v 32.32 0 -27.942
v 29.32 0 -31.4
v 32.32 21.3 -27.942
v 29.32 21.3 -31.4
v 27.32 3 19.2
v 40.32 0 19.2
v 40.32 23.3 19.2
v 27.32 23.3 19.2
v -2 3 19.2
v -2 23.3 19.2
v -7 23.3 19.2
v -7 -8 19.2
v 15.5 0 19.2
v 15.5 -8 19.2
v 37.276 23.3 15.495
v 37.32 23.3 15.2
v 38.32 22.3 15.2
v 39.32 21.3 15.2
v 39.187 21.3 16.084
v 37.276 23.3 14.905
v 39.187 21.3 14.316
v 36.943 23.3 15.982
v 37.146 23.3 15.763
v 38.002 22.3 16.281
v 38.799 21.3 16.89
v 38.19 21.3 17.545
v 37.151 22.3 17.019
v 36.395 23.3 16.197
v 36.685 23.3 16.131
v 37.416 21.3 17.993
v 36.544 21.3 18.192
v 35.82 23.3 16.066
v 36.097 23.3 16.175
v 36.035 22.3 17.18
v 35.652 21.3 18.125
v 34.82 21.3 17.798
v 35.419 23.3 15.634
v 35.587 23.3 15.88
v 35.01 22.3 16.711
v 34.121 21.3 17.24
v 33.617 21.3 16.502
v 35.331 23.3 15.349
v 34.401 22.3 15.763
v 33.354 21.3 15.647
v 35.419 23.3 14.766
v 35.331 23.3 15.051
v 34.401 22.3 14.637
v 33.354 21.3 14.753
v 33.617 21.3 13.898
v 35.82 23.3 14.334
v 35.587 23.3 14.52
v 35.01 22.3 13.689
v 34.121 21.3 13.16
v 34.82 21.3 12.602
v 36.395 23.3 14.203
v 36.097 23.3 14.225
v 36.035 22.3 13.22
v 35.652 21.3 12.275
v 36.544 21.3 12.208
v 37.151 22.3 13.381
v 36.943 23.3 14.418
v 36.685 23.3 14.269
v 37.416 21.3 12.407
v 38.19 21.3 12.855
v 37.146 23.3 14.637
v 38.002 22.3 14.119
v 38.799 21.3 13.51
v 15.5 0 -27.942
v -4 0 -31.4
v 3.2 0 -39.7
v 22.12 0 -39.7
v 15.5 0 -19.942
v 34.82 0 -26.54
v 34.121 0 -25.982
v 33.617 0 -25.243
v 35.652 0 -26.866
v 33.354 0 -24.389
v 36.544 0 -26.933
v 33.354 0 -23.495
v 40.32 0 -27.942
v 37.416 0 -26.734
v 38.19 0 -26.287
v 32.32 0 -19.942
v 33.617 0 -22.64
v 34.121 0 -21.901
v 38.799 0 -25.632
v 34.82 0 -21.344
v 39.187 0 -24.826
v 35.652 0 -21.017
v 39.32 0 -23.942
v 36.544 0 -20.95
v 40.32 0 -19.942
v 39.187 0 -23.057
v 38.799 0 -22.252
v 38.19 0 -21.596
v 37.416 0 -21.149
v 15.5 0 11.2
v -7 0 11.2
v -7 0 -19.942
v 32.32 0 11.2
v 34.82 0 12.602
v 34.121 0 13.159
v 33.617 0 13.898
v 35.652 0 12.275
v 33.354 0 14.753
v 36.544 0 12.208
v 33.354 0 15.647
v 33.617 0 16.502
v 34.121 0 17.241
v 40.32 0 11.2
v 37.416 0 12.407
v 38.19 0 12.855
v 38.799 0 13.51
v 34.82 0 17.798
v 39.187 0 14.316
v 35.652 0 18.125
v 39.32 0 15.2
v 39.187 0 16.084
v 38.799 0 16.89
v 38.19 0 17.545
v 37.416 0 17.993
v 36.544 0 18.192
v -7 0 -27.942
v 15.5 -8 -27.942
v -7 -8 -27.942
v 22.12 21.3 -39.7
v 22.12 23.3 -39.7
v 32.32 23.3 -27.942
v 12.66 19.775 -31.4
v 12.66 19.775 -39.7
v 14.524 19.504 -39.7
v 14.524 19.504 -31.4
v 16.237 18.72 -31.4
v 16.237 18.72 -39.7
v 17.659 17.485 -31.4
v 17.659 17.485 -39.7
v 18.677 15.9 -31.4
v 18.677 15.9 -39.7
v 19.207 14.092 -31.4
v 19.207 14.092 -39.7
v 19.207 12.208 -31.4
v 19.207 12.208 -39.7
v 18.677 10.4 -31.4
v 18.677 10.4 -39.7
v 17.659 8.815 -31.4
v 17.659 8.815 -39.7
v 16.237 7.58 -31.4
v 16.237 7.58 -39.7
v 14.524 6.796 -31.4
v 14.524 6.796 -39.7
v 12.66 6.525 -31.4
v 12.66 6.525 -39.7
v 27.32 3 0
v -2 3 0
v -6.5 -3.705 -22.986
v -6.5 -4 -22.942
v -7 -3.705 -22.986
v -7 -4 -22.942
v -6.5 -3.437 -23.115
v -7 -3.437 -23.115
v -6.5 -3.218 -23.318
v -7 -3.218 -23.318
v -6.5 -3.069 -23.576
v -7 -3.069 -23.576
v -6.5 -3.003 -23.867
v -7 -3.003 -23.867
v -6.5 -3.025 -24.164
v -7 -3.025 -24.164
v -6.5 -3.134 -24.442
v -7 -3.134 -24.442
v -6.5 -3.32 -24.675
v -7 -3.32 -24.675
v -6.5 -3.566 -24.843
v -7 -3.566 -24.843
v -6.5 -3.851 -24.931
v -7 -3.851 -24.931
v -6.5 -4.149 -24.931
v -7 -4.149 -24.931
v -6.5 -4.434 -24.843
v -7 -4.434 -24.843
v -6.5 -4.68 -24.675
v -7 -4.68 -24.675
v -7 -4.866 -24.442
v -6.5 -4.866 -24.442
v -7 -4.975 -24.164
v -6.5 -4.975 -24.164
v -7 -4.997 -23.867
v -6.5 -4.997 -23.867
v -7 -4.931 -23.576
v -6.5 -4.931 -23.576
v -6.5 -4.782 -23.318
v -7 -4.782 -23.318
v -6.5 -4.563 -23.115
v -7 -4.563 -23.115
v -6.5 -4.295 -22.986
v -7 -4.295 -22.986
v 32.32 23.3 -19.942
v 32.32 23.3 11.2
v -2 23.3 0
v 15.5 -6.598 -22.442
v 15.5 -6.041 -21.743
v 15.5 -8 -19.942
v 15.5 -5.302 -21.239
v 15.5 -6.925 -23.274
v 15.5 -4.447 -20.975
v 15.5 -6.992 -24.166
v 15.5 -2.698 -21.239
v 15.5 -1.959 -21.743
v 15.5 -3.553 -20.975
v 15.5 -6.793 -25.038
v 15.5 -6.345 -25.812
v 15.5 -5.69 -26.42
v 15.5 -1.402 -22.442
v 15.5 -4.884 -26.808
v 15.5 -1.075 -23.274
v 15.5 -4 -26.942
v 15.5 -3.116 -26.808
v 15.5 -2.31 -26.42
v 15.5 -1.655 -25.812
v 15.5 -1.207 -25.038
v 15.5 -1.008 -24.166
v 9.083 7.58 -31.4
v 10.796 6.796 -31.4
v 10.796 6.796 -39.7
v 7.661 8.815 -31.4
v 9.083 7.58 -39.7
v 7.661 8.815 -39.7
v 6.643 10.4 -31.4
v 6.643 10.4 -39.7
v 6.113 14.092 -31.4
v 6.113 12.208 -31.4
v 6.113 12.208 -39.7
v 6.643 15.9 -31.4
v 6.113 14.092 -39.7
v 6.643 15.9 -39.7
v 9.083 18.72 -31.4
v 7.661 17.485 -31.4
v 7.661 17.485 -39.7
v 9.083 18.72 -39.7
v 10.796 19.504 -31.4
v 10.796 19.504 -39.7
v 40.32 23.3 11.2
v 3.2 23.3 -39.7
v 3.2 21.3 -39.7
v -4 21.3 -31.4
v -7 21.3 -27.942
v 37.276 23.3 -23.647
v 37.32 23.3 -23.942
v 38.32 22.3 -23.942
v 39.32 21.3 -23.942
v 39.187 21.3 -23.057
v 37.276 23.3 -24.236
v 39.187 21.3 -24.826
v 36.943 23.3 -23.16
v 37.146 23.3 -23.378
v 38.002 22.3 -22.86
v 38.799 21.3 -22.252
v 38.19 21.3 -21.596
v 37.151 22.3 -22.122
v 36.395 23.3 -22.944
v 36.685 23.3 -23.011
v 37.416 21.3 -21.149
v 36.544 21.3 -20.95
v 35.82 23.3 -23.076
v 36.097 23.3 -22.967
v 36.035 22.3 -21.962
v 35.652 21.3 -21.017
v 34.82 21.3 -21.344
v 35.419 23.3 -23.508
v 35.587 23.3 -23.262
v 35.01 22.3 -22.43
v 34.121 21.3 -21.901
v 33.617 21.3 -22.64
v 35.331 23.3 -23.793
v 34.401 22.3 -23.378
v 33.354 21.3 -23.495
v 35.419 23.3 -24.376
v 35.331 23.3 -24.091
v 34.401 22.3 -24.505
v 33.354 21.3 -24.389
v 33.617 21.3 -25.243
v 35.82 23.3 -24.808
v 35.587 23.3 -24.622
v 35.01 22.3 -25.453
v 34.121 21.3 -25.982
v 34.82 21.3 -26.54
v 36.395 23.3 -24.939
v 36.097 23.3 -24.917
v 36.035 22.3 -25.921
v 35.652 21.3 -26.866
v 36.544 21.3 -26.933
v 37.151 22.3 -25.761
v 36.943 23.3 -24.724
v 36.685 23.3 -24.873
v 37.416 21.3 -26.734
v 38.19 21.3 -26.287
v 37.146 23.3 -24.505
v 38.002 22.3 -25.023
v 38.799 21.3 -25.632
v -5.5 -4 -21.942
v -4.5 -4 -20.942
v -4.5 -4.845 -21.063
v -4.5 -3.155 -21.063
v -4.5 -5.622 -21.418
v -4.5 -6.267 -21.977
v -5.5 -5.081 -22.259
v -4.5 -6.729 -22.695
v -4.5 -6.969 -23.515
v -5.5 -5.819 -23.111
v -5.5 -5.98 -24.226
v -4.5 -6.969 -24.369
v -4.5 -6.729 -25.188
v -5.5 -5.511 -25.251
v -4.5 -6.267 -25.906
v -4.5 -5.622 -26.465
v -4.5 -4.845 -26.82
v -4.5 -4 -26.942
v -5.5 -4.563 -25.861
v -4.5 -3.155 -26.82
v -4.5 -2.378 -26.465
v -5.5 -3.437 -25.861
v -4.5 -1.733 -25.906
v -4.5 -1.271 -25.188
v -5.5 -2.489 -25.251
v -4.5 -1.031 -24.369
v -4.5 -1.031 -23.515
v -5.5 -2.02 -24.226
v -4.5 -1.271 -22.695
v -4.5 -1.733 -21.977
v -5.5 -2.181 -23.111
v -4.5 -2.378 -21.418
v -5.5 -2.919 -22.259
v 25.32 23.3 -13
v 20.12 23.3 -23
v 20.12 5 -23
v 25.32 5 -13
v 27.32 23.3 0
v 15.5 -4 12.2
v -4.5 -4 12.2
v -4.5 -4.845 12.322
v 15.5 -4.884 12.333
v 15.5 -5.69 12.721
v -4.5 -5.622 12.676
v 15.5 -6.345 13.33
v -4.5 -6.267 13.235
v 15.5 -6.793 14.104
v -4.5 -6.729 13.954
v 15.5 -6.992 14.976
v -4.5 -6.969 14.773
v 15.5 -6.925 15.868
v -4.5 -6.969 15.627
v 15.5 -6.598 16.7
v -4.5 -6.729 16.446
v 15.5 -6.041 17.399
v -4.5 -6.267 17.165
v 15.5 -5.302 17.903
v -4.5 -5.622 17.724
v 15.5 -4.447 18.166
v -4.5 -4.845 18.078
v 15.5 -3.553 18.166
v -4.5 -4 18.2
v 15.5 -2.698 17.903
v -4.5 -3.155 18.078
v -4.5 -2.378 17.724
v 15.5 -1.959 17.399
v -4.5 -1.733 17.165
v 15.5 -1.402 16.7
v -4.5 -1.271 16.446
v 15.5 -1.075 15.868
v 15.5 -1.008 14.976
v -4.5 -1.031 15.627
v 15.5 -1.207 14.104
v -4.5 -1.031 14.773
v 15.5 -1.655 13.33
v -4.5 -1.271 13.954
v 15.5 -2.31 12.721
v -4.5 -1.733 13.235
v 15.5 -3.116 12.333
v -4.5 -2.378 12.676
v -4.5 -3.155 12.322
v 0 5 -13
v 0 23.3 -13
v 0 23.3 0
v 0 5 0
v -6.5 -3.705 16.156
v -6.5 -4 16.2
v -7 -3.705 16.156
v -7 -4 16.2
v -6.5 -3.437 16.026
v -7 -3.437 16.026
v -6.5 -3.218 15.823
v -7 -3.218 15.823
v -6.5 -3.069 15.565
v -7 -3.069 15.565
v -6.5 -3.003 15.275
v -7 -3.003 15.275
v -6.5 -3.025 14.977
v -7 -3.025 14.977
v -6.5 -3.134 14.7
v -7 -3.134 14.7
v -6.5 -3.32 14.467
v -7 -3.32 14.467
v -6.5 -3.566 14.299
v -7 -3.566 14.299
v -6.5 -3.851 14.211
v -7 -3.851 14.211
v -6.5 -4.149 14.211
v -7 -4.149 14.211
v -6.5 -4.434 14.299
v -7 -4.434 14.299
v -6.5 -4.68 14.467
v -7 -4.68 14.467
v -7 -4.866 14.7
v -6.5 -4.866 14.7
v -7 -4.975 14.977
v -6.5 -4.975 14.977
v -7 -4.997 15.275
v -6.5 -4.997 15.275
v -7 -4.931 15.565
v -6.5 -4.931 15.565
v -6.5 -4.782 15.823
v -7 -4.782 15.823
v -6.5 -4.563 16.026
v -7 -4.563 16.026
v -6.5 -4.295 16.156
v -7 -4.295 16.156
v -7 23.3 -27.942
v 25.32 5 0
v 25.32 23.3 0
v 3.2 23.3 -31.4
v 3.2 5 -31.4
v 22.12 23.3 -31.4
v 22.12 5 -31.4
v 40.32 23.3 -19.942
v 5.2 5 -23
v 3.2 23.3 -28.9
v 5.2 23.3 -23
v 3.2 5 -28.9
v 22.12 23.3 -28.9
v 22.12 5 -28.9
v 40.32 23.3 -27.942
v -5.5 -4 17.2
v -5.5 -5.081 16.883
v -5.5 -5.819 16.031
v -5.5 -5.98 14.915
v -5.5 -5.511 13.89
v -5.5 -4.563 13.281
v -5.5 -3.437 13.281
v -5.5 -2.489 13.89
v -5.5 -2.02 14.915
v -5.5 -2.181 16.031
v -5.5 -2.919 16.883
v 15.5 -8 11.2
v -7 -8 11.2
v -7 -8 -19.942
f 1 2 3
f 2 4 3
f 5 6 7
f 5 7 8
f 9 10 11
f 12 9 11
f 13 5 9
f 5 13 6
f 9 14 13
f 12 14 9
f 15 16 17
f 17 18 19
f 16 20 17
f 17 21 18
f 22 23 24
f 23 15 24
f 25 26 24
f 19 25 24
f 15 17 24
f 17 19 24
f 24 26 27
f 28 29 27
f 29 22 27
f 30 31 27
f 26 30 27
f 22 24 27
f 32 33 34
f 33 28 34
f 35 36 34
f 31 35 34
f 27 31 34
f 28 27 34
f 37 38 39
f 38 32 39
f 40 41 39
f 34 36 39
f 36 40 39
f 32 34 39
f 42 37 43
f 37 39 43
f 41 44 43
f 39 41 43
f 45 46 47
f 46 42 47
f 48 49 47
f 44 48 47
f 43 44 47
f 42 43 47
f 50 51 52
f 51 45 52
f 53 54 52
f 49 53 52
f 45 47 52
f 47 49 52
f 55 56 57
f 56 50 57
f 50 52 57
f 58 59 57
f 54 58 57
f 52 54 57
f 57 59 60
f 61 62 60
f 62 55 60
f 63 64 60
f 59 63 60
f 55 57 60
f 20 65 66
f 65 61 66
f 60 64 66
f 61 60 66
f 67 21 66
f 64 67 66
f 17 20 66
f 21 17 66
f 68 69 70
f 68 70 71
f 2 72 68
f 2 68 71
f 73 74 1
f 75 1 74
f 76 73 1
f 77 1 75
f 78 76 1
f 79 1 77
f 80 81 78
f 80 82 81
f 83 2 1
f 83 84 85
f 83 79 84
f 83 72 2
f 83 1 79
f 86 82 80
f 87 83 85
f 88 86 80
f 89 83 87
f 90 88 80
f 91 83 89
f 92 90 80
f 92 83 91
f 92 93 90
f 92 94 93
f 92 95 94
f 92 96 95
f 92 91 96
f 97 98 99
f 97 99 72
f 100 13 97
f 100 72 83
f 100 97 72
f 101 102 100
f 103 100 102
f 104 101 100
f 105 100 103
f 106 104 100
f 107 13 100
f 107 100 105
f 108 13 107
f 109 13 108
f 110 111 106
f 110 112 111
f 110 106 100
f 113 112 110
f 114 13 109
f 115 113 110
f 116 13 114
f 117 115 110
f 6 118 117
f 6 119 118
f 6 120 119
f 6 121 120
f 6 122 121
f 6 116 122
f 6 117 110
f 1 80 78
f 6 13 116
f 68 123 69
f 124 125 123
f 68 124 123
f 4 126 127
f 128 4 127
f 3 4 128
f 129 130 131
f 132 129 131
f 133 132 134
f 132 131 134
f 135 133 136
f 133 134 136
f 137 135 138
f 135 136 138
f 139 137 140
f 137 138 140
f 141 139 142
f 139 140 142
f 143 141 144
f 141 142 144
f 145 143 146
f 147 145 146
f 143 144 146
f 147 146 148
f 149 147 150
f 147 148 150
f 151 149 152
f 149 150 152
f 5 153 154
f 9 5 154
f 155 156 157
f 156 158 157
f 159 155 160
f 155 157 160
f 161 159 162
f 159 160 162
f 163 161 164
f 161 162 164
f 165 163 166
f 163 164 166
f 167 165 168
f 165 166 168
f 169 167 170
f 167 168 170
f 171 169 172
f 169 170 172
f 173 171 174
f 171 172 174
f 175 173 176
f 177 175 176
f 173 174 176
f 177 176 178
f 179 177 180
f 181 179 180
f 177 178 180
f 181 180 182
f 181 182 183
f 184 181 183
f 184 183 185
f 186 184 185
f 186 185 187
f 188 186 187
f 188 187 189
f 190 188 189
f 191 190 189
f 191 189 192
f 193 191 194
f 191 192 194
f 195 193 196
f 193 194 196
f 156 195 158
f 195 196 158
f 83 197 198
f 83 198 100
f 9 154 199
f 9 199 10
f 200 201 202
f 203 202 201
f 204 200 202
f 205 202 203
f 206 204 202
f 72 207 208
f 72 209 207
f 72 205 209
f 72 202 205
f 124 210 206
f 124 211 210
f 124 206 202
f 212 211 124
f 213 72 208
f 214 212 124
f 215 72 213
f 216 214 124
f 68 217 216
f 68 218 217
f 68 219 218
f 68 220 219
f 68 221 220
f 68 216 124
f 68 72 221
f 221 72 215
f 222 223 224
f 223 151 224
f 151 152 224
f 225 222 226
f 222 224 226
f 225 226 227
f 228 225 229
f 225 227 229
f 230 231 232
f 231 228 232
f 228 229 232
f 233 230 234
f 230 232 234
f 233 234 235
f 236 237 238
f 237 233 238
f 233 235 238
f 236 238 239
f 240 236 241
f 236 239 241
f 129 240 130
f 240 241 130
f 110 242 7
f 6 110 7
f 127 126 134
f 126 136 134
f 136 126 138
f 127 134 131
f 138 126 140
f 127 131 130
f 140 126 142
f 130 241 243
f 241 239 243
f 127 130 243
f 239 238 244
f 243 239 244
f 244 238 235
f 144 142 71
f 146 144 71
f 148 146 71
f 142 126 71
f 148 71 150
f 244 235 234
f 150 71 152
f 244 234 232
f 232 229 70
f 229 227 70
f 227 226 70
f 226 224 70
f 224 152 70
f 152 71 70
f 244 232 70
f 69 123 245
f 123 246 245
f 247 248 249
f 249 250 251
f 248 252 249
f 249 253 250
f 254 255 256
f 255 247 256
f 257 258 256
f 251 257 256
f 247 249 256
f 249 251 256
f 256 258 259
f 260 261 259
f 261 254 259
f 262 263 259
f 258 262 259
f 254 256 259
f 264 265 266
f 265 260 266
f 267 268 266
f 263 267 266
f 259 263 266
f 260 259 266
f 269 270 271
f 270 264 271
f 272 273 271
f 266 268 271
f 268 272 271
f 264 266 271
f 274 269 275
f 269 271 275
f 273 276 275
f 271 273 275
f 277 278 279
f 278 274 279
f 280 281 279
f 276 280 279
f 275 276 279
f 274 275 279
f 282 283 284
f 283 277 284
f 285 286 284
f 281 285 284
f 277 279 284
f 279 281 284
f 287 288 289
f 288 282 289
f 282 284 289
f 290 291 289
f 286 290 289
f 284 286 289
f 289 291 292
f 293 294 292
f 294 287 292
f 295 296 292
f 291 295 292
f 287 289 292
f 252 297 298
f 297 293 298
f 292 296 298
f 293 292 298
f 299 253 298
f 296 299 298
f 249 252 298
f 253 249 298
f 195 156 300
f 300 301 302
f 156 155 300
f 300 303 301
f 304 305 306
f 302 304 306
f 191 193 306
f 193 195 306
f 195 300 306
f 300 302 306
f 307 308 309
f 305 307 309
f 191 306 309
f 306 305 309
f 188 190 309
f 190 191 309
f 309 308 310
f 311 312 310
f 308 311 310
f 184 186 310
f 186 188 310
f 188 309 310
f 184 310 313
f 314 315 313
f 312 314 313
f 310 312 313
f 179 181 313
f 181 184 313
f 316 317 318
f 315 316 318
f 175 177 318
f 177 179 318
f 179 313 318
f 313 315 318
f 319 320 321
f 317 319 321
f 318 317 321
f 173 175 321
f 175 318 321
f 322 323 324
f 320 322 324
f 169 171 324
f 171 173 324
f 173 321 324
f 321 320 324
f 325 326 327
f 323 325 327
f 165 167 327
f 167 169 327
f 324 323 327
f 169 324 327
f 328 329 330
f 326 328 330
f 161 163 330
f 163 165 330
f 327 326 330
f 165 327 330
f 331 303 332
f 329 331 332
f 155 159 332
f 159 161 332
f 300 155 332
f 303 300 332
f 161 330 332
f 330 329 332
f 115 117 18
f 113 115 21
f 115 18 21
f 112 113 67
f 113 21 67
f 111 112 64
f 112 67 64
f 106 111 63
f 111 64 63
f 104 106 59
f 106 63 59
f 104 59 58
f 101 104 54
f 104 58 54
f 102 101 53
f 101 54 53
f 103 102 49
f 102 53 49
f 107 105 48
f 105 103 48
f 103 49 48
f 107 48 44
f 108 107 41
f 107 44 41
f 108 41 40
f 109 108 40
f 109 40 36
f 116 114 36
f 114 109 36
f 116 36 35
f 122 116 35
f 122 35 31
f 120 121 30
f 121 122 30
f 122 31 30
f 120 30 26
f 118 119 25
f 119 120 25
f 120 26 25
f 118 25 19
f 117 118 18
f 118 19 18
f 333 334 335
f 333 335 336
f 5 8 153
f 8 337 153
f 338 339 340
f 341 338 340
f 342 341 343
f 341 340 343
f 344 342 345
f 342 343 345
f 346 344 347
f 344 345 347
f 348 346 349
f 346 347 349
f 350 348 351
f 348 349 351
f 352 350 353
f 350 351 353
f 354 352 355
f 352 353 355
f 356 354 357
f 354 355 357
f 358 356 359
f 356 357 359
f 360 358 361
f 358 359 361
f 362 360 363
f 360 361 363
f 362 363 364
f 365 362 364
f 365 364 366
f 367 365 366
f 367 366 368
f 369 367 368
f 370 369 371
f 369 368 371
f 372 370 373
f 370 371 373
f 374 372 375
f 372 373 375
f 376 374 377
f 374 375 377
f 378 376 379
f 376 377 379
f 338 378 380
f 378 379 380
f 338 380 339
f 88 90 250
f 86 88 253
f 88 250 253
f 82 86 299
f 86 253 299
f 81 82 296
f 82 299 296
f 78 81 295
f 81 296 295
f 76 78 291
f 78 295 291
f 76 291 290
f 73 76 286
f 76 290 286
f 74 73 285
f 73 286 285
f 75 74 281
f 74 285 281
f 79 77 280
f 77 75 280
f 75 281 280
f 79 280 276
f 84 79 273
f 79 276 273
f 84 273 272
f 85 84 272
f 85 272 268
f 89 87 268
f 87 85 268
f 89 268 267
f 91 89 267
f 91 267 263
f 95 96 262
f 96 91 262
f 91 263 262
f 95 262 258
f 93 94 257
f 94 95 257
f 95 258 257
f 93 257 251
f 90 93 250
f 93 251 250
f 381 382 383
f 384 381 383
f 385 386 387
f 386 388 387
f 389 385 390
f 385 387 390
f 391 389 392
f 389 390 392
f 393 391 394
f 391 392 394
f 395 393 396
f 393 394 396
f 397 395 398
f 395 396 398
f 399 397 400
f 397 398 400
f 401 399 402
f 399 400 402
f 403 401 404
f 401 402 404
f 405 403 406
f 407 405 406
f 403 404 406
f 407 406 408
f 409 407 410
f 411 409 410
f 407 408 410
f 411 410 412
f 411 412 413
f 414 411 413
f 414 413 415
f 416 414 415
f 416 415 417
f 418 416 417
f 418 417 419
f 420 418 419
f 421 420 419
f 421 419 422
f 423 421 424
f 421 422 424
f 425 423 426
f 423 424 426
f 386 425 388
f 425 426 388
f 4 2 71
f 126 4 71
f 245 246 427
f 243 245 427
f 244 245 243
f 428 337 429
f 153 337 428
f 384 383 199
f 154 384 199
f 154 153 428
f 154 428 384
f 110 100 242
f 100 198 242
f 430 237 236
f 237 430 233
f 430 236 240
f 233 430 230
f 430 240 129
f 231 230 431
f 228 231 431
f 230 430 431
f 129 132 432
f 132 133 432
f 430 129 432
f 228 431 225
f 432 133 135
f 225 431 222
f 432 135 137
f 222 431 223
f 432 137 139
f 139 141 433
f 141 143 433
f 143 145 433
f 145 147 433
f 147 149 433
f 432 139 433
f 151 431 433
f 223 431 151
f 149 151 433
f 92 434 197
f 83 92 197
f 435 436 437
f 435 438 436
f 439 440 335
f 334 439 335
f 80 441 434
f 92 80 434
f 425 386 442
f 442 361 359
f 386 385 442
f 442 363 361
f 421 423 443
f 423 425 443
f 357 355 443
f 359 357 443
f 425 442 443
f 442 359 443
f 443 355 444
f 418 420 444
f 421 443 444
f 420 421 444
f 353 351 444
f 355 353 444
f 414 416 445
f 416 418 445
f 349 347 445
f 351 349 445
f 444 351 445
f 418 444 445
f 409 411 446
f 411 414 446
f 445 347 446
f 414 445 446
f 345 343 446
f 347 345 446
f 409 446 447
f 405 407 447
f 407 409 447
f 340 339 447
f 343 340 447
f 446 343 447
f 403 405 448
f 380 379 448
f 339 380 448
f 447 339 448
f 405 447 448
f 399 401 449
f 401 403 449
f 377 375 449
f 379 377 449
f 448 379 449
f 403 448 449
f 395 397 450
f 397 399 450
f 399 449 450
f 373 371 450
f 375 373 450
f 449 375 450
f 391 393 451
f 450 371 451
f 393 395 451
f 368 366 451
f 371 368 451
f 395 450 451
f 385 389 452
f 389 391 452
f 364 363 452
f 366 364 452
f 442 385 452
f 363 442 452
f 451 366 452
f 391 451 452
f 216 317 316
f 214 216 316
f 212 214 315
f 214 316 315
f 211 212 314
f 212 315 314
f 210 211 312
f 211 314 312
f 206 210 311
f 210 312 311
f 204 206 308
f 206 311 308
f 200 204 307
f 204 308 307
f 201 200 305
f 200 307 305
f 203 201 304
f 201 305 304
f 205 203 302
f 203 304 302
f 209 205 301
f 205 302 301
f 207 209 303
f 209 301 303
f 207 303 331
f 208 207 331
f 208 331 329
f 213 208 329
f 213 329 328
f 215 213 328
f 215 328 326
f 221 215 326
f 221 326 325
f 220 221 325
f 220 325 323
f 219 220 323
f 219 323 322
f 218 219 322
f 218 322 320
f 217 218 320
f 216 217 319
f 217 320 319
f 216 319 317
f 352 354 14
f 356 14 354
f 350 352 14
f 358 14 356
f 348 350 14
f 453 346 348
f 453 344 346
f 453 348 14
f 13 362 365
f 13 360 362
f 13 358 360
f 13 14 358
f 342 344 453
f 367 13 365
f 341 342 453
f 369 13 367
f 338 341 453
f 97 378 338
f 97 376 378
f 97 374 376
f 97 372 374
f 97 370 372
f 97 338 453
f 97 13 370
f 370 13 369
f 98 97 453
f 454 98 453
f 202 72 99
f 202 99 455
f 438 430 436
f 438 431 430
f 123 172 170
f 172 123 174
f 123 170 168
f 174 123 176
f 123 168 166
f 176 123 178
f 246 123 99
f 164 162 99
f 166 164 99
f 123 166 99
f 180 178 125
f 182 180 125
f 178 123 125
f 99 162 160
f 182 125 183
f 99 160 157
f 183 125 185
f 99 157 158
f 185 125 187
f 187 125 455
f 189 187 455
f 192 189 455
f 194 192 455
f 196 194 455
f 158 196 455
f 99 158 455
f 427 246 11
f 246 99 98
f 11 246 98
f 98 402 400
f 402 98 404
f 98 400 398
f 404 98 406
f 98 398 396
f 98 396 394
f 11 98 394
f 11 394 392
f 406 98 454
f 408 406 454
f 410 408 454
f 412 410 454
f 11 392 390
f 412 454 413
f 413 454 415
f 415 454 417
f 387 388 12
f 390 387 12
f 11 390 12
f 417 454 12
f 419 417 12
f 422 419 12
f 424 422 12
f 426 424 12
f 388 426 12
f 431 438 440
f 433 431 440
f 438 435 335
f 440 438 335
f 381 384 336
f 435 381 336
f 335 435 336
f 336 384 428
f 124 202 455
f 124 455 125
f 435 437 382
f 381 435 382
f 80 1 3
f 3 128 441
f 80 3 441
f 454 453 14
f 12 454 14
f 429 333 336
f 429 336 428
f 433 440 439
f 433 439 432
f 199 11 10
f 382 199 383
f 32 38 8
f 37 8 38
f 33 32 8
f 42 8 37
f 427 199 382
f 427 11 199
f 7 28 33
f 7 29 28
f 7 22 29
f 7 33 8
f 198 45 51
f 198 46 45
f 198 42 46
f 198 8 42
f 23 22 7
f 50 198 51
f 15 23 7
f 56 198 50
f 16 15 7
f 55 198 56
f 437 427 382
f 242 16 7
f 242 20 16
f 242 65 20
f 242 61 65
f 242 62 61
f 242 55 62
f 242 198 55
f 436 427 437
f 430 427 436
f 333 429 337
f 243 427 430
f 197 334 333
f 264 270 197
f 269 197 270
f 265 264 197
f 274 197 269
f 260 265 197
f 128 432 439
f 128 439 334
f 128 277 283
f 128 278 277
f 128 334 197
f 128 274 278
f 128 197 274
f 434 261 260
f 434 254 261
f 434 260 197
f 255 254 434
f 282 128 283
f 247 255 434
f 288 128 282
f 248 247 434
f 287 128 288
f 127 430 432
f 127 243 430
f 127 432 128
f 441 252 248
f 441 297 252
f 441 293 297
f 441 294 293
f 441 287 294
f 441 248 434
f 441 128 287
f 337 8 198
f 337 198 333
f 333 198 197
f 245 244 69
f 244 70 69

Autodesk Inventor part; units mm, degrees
ref_plane "YZ Plane" through (0, 0, 0) normal (1, 0, 0) x (0, 1, 0)
ref_plane "XZ Plane" through (0, 0, 0) normal (0, 1, 0) x (-1, 0, 0)
ref_plane "XY Plane" through (0, 0, 0) normal (0, 0, 1) x (1, 0, 0)
sketch "Sketch1" plane through (0, 0, 0) normal (0, 1, 0) x (-1, 0, 0)
  line L0 (0, 0) -> (-25.32, 0)
  line L1 (-25.32, 0) -> (-25.32, -13)
  line L2 (-25.32, -13) -> (0, -13)
  line L3 (0, -13) -> (0, 0)
  dimension "d0" = 25.32
  dimension "d1" = 13
extrude "Extrusion1" add sketch "Sketch1" along normal blind 5
sketch "Sketch2" plane through (25.32, 0, 0) normal (1, 0, 0) x (0, 0, -1)
  line L0 (0, 0) -> (13, 0)
  line L1 (13, 0) -> (13, 21.3)
  line L2 (13, 21.3) -> (0, 21.3)
  line L3 (0, 21.3) -> (0, 0)
  dimension "d4" = 13
  dimension "d5" = 21.3
extrude "Extrusion2" add sketch "Sketch2" along normal blind 7
sketch "Sketch3" plane through (0, 0, 0) normal (0, -1, 0) x (1, 0, 0)
  line L0 (25.32, -13) -> (0, -13) projected
  line L1 (25.32, -8.0084) -> (25.32, -13)
  line L2 (25.32, -13) -> (25.32, -23) construction
  line L3 (25.32, -23) -> (20.12, -23) construction
  line L4 (20.12, -23) -> (25.32, -13)
  line L5 (20.12, -23) -> (5.2, -23)
  line L6 (0, -23) -> (5.2, -23)
  line L7 (5.2, -23) -> (0, -13)
  line L8 (0, -13) -> (5.2, -23)
  point P0 (0, 0)
  dimension "d8" = 10
  dimension "d9" = 5.2
  dimension "d10" = 5.2
extrude "Extrusion3" add sketch "Sketch3" against normal blind 5
sketch "Sketch4" plane through (0, 0, 0) normal (0, -1, 0) x (1, 0, 0)
  line L0 (20.12, -23) -> (25.32, -13) projected
  line L1 (20.12, -23) -> (27.32, -23)
  line L2 (25.32, -13) -> (32.32, -13) projected
  line L3 (32.32, -13) -> (27.32, -23)
  point P0 (0, 0)
  dimension "d13" = 7.2
extrude "Extrusion4" add sketch "Sketch4" against normal blind 21.3
sketch "Sketch5" plane through (0, 0, 0) normal (0, -1, 0) x (1, 0, 0)
  line L0 (20.12, -23) -> (5.2, -23) projected
  line L1 (20.12, -23) -> (20.12, -28.9) construction
  line L2 (20.12, -28.9) -> (22.12, -28.9) construction
  line L3 (20.12, -23) -> (25.32, -13) projected
  line L4 (22.12, -28.9) -> (20.12, -23)
  line L5 (27.32, -23) -> (20.12, -23) projected
  line L6 (27.32, -23) -> (27.32, -28.9)
  line L7 (27.32, -28.9) -> (29.32, -28.9) construction
  line L8 (29.32, -28.9) -> (27.32, -23)
  line L9 (29.32, -28.9) -> (22.12, -28.9)
  line L10 (5.2, -23) -> (5.2, -28.9) construction
  line L11 (5.2, -28.9) -> (3.2, -28.9) construction
  line L12 (3.2, -28.9) -> (5.2, -23)
  line L13 (22.12, -28.9) -> (3.2, -28.9)
  point P0 (0, 0)
  dimension "d16" = 5.9
  dimension "d17" = 2
  dimension "d18" = 2
  dimension "d19" = 2
extrude "Extrusion5" add sketch "Sketch5" against normal blind 5 contours L4 L13 L12 L0
sketch "Sketch6" plane through (0, 0, 0) normal (0, -1, 0) x (1, 0, 0)
  line L0 (20.12, -23) -> (27.32, -23) projected
  line L1 (27.32, -23) -> (27.32, -28.9) construction
  line L2 (27.32, -28.9) -> (29.32, -28.9) construction
  line L3 (29.32, -28.9) -> (27.32, -23)
  line L4 (20.12, -23) -> (22.12, -28.9) projected
  line L5 (29.32, -28.9) -> (22.12, -28.9)
  point P0 (0, 0)
  dimension "d22" = 5.9
  dimension "d23" = 2
extrude "Extrusion6" add sketch "Sketch6" against normal blind 21.3
sketch "Sketch7" plane through (0, 0, 0) normal (0, -1, 0) x (1, 0, 0)
  line L0 (22.12, -28.9) -> (3.2, -28.9) projected
  line L1 (22.12, -28.9) -> (22.12, -31.4)
  line L2 (3.2, -28.9) -> (5.2, -23) projected
  line L3 (3.2, -28.9) -> (3.2, -31.4)
  line L4 (3.2, -31.4) -> (22.12, -31.4)
  point P0 (0, 0)
  dimension "d26" = 2.5
  dimension "d27" = 2.5
extrude "Extrusion7" add sketch "Sketch7" against normal blind 5
sketch "Sketch8" plane through (0, 0, 0) normal (0, -1, 0) x (1, 0, 0)
  line L0 (27.32, -23) -> (29.32, -28.9) projected
  line L1 (22.12, -28.9) -> (22.12, -31.4) projected
  line L2 (29.32, -28.9) -> (22.12, -28.9)
  line L3 (22.12, -28.9) -> (22.12, -31.4)
  line L4 (22.12, -31.4) -> (29.32, -31.4)
  line L5 (29.32, -31.4) -> (29.32, -28.9)
  point P0 (0, 0)
extrude "Extrusion8" add sketch "Sketch8" against normal blind 21.3
sketch "Sketch9" plane through (0, 0, 0) normal (0, -1, 0) x (1, 0, 0)
  line L0 (22.12, -31.4) -> (3.2, -31.4) projected
  line L1 (3.2, -31.4) -> (22.12, -31.4)
  line L2 (22.12, -31.4) -> (22.12, -39.7)
  line L3 (22.12, -39.7) -> (3.2, -39.7)
  line L4 (3.2, -39.7) -> (3.2, -31.4)
  point P0 (0, 0)
  dimension "d32" = 18.92
  dimension "d33" = 8.3
extrude "Extrusion9" add sketch "Sketch9" against normal blind 21.3
sketch "Sketch10" plane through (0, 0, 0) normal (0, -1, 0) x (1, 0, 0)
  line L0 (22.12, -31.4) -> (29.32, -31.4) projected
  line L1 (22.12, -31.4) -> (22.12, -39.7) projected
  line L2 (29.32, -31.4) -> (22.12, -39.7)
  point P0 (0, 0)
extrude "Extrusion10" add sketch "Sketch10" against normal blind 21.3
sketch "Sketch11" plane through (3.2, 0, -39.7) normal (0, 0, -1) x (-1, 0, 0)
  line L0 (0, 5) -> (-2, 5) projected
  line L1 (0, 5) -> (-18.878, 5) construction
  line L2 (0, 21.3) -> (-18.92, 21.3) projected
  line L3 (-9.46, 21.3) -> (-9.439, 5) construction
  line L4 (-9.4495, 13.15) -> (0, 13.1622) construction
  line L5 (0, 0) -> (0, 21.3) projected
  circle A0 centre (-9.4495, 13.15) radius 6.625
  point P0 (3.2, 0)
  dimension "d38" = 13.25
extrude "Extrusion11" cut sketch "Sketch11" against normal blind 21.3
sketch "Sketch12" plane through (25.32, 21.3, 0) normal (0, 1, 0) x (1, 0, 0)
  line L0 (7, 13) -> (2, 23) projected
  line L1 (4, 31.4) -> (4, 28.9) projected
  line L2 (7, 13) -> (4, 31.4)
  line L3 (2, 23) -> (4, 28.9) projected
  line L4 (2, 23) -> (4, 28.9)
  line L5 (4, 28.9) -> (4, 31.4)
  line L6 (7, 13) -> (2, 23)
  point P0 (-25.32, 0)
extrude "Extrusion12" add sketch "Sketch12" against normal blind 21.3
sketch "Sketch13" plane through (25.32, 21.3, 0) normal (0, 1, 0) x (1, 0, 0)
  line L0 (4, 31.4) -> (7, 13) projected
  line L1 (7, 13) -> (7, 31.4) construction
  line L2 (4, 31.4) -> (7, 27.9417)
  line L3 (4, 31.4) -> (-3.2, 39.7) projected
  line L4 (7, 27.9417) -> (7, 13)
  line L5 (7, 13) -> (4, 31.4)
  point P0 (-25.32, 0)
extrude "Extrusion13" add sketch "Sketch13" against normal blind 21.3
ref_plane "Work Plane1" through (12.66, 5, 0) normal (1, 0, 0) x (0, 1, 0)
mirror "Mirror1" about plane through (12.66, 5, 0) normal (1, 0, 0)
sketch "Sketch16" plane through (25.32, 5, 0) normal (0, 0, 1) x (1, 0, 0)
  line L0 (-20.12, 0) -> (-25.32, 0) projected
  line L1 (-25.32, 0) -> (-25.32, -2) construction
  line L2 (-25.32, -2) -> (-27.32, -2)
  line L3 (-27.32, -2) -> (-27.32, 16.3)
  line L4 (-25.32, 16.3) -> (-32.32, 16.3) projected
  line L5 (0, 0) -> (2, 0) construction
  line L6 (2, 0) -> (2, -2)
  line L7 (2, -2) -> (-25.32, -2)
  line L8 (2, 0) -> (2, 16.3)
  line L9 (-27.32, 16.3) -> (-32.32, 16.3)
  line L10 (-32.32, 16.3) -> (-32.32, -5) projected
  line L11 (-32.32, 16.3) -> (-32.32, -5)
  line L12 (-32.32, -5) -> (7, -5)
  line L13 (7, 16.3) -> (7, -5) projected
  line L14 (7, -5) -> (7, 16.3)
  line L15 (7, 16.3) -> (2, 16.3)
  line L16 (0, 16.3) -> (7, 16.3) projected
  point P0 (-25.32, -5)
  dimension "d45" = 2
  dimension "d46" = 2
  dimension "d47" = 2
  dimension "d48" = 2
extrude "Extrusion14" add sketch "Sketch16" along normal blind 19.2
sketch "Sketch22" plane through (-7, 0, -27.9417) normal (-1, 0, 0) x (0, 0, 1)
  line L0 (-11.7583, 0) -> (0, 0) projected
  line L1 (0, 0) -> (8, 0)
  line L2 (8, 0) -> (8, -8)
  line L3 (8, -8) -> (0, -8)
  line L4 (0, -8) -> (0, 0)
  line L5 (47.1417, 0) -> (0, 0) projected
  line L6 (47.1417, 0) -> (39.1417, 0)
  line L7 (39.1417, 0) -> (39.1417, -8)
  line L8 (39.1417, -8) -> (47.1417, -8)
  line L9 (47.1417, -8) -> (47.1417, 0)
  line L10 (0, -4) -> (47.1417, -4) construction
  line L11 (4, -8) -> (4, -4) construction
  line L12 (43.1417, -8) -> (43.1417, -4) construction
  circle A0 centre (4, -4) radius 1
  circle A1 centre (43.1417, -4) radius 1
  point P0 (27.9417, 0)
  dimension "d81" = 8
  dimension "d82" = 8
  dimension "d83" = 8
  dimension "d84" = 8
  dimension "d85" = 2
  dimension "d86" = 2
extrude "Extrusion20" add sketch "Sketch22" against normal blind 2.5
chamfer "Chamfer2" distance 2 angle 45 2 edges at (-4.5, -4, -24.9417) (-4.5, -4, 14.2)
sketch "Sketch24" plane through (25.32, 21.3, 0) normal (0, 1, 0) x (1, 0, 0)
  line L0 (-27.32, -19.2) -> (-32.32, -19.2) projected
  line L1 (-27.32, -19.2) -> (-32.32, -19.2)
  line L2 (-32.32, 27.9417) -> (-32.32, -19.2) projected
  line L3 (-32.32, -19.2) -> (-32.32, 27.9417)
  line L4 (-32.32, 27.9417) -> (-22.12, 39.7) projected
  line L5 (-32.32, 27.9417) -> (-22.12, 39.7)
  line L6 (-3.2, 39.7) -> (-22.12, 39.7) projected
  line L7 (-22.12, 39.7) -> (-3.2, 39.7)
  line L8 (-3.2, 39.7) -> (7, 27.9417)
  line L9 (7, -19.2) -> (7, 27.9417) projected
  line L10 (7, 27.9417) -> (7, -19.2)
  line L11 (7, -19.2) -> (2, -19.2) projected
  line L12 (7, -19.2) -> (2, -19.2)
  line L13 (0, 0) -> (2, 0) projected
  line L14 (2, -19.2) -> (2, 0)
  line L15 (2, 0) -> (0, 0)
  line L16 (0, 13) -> (0, 0) projected
  line L17 (0, 0) -> (0, 13)
  line L18 (-5.2, 23) -> (0, 13) projected
  line L19 (0, 13) -> (-5.2, 23)
  line L20 (-3.2, 28.9) -> (-5.2, 23) projected
  line L21 (-5.2, 23) -> (-3.2, 28.9)
  line L22 (-3.2, 28.9) -> (-3.2, 31.4)
  line L23 (-22.12, 31.4) -> (-3.2, 31.4) projected
  line L24 (-3.2, 31.4) -> (-22.12, 31.4)
  line L25 (-22.12, 31.4) -> (-22.12, 28.9) projected
  line L26 (-22.12, 31.4) -> (-22.12, 28.9)
  line L27 (-22.12, 28.9) -> (-20.12, 23) projected
  line L28 (-22.12, 28.9) -> (-20.12, 23)
  line L29 (-20.12, 23) -> (-25.32, 13) projected
  line L30 (-20.12, 23) -> (-25.32, 13)
  line L31 (-25.32, 13) -> (-25.32, 0) projected
  line L32 (-25.32, 13) -> (-25.32, 0)
  line L33 (-25.32, 0) -> (-27.32, 0) projected
  line L34 (-25.32, 0) -> (-27.32, 0)
  line L35 (-27.32, 0) -> (-27.32, -19.2) projected
  line L36 (-27.32, 0) -> (-27.32, -19.2)
  line L37 (-25.32, 13) -> (-25.32, 0) projected
  line L38 (0, 0) -> (-25.32, 0)
extrude "Extrusion22" add sketch "Sketch24" along normal blind 2 contours L0 L2 L4 L6 L8 L9 L11 L14 L13 L16 L18 L20 L22 L23 L25 L27 L29 L31 L33 L35
sketch "Sketch25" plane through (25.32, 23.3, 0) normal (0, 1, 0) x (1, 0, 0)
  line L0 (2, -19.2) -> (7, -19.2) projected
  line L1 (7, -19.2) -> (15, -19.2)
  line L2 (15, -19.2) -> (15, -11.2)
  line L3 (15, -11.2) -> (7, -11.2)
  line L4 (7, -11.2) -> (7, -19.2)
  line L5 (7, -19.2) -> (7, 27.9417) projected
  line L6 (7, 27.9417) -> (15, 27.9417)
  line L7 (15, 27.9417) -> (15, 19.9417)
  line L8 (15, 19.9417) -> (7, 19.9417)
  line L9 (7, 19.9417) -> (7, 27.9417)
  line L10 (11, -19.2) -> (11, 27.9417) construction
  line L11 (15, -15.2) -> (11, -15.2) construction
  line L12 (15, 23.9417) -> (11, 23.9417) construction
  circle A0 centre (11, -15.2) radius 1
  circle A1 centre (11, 23.9417) radius 1
  point P0 (-25.32, 0)
  dimension "d96" = 8
  dimension "d97" = 8
  dimension "d98" = 8
  dimension "d99" = 8
  dimension "d100" = 2
  dimension "d101" = 2
extrude "Extrusion23" add sketch "Sketch25" against normal blind 2
chamfer "Chamfer3" distance 2 angle 45 2 edges at (35.32, 21.3, 15.2) (35.32, 21.3, -23.9417)
sketch "Sketch26" plane through (25.32, 21.3, 0) normal (0, -1, 0) x (1, 0, 0)
  circle A0 centre (11, 15.2) radius 1 projected
  circle A1 centre (11, 15.2) radius 3 projected
  line L0 (15, 19.2) -> (7, 19.2) projected
  line L1 (7, 11.2) -> (7, 19.2) projected
  line L2 (7, 11.2) -> (15, 11.2) projected
  line L3 (15, 11.2) -> (15, 19.2) projected
  circle A2 centre (11, 15.2) radius 3 projected
  circle A3 centre (11, 15.2) radius 3
  line L4 (15, 19.2) -> (7, 19.2) projected
  line L5 (15, 19.2) -> (7, 19.2)
  line L6 (7, 19.2) -> (7, 11.2)
  line L7 (7, 11.2) -> (15, 11.2)
  line L8 (15, 11.2) -> (15, 19.2)
  point P0 (-25.32, 0)
extrude "Extrusion24" add sketch "Sketch26" along normal blind 21.3 contours L3 L2 L1 L0
sketch "Sketch28" plane through (25.32, 21.3, 0) normal (0, -1, 0) x (1, 0, 0)
  circle A0 centre (11, -23.9417) radius 1 projected
  circle A1 centre (11, -23.9417) radius 3 projected
  line L0 (7, -27.9417) -> (7, -19.9417) projected
  line L1 (7, -27.9417) -> (15, -27.9417) projected
  line L2 (15, -27.9417) -> (15, -19.9417) projected
  line L3 (15, -19.9417) -> (7, -19.9417) projected
  circle A2 centre (11, -23.9417) radius 3 projected
  circle A3 centre (11, -23.9417) radius 3
  line L4 (7, -27.9417) -> (-3.2, -39.7) projected
  line L5 (15, -19.9417) -> (15, -27.9417) projected
  line L6 (7, -27.9417) -> (15, -27.9417)
  line L7 (15, -27.9417) -> (15, -19.9417)
  line L8 (15, -19.9417) -> (7, -19.9417)
  line L9 (7, -19.9417) -> (7, -27.9417)
  point P0 (-25.32, 0)
extrude "Extrusion25" add sketch "Sketch28" along normal blind 21.3 contours L0 L3 L2 L1
sketch "Sketch29" plane through (-4.5, 0, -27.9417) normal (1, 0, 0) x (0, 0, -1)
  circle A0 centre (-43.1417, -4) radius 1 projected
  circle A1 centre (-43.1417, -4) radius 3 projected
  line L0 (-47.1417, 0) -> (-39.1417, 0) projected
  line L1 (-47.1417, 0) -> (-47.1417, -8) projected
  line L2 (-47.1417, -8) -> (-39.1417, -8) projected
  line L3 (-39.1417, -8) -> (-39.1417, 0) projected
  circle A2 centre (-43.1417, -4) radius 3 projected
  circle A3 centre (-4, -4) radius 1 projected
  circle A4 centre (-4, -4) radius 3 projected
  line L4 (0, -8) -> (0, 0) projected
  line L5 (-8, 0) -> (0, 0) projected
  line L6 (-8, 0) -> (-8, -8) projected
  line L7 (-8, -8) -> (0, -8) projected
  circle A5 centre (-4, -4) radius 3 projected
  line L8 (-39.1417, -8) -> (-47.1417, -8)
  line L9 (-47.1417, -8) -> (-47.1417, 0)
  line L10 (-47.1417, 0) -> (-39.1417, 0)
  line L11 (-39.1417, 0) -> (-39.1417, -8)
  line L12 (-8, -8) -> (0, -8) projected
  line L13 (0, -8) -> (-8, -8)
  line L14 (-8, -8) -> (-8, 0)
  line L15 (-8, 0) -> (0, 0)
  line L16 (0, 0) -> (0, -8)
  circle A6 centre (-43.1417, -4) radius 3
  circle A7 centre (-4, -4) radius 1 projected
  circle A8 centre (-4, -4) radius 3
  point P0 (-27.9417, 0)
extrude "Extrusion26" add sketch "Sketch29" along normal blind 20 contours L0 L3 L2 L1 | L7 L6 L5 L4
properties part number "AC_wire_holder"
